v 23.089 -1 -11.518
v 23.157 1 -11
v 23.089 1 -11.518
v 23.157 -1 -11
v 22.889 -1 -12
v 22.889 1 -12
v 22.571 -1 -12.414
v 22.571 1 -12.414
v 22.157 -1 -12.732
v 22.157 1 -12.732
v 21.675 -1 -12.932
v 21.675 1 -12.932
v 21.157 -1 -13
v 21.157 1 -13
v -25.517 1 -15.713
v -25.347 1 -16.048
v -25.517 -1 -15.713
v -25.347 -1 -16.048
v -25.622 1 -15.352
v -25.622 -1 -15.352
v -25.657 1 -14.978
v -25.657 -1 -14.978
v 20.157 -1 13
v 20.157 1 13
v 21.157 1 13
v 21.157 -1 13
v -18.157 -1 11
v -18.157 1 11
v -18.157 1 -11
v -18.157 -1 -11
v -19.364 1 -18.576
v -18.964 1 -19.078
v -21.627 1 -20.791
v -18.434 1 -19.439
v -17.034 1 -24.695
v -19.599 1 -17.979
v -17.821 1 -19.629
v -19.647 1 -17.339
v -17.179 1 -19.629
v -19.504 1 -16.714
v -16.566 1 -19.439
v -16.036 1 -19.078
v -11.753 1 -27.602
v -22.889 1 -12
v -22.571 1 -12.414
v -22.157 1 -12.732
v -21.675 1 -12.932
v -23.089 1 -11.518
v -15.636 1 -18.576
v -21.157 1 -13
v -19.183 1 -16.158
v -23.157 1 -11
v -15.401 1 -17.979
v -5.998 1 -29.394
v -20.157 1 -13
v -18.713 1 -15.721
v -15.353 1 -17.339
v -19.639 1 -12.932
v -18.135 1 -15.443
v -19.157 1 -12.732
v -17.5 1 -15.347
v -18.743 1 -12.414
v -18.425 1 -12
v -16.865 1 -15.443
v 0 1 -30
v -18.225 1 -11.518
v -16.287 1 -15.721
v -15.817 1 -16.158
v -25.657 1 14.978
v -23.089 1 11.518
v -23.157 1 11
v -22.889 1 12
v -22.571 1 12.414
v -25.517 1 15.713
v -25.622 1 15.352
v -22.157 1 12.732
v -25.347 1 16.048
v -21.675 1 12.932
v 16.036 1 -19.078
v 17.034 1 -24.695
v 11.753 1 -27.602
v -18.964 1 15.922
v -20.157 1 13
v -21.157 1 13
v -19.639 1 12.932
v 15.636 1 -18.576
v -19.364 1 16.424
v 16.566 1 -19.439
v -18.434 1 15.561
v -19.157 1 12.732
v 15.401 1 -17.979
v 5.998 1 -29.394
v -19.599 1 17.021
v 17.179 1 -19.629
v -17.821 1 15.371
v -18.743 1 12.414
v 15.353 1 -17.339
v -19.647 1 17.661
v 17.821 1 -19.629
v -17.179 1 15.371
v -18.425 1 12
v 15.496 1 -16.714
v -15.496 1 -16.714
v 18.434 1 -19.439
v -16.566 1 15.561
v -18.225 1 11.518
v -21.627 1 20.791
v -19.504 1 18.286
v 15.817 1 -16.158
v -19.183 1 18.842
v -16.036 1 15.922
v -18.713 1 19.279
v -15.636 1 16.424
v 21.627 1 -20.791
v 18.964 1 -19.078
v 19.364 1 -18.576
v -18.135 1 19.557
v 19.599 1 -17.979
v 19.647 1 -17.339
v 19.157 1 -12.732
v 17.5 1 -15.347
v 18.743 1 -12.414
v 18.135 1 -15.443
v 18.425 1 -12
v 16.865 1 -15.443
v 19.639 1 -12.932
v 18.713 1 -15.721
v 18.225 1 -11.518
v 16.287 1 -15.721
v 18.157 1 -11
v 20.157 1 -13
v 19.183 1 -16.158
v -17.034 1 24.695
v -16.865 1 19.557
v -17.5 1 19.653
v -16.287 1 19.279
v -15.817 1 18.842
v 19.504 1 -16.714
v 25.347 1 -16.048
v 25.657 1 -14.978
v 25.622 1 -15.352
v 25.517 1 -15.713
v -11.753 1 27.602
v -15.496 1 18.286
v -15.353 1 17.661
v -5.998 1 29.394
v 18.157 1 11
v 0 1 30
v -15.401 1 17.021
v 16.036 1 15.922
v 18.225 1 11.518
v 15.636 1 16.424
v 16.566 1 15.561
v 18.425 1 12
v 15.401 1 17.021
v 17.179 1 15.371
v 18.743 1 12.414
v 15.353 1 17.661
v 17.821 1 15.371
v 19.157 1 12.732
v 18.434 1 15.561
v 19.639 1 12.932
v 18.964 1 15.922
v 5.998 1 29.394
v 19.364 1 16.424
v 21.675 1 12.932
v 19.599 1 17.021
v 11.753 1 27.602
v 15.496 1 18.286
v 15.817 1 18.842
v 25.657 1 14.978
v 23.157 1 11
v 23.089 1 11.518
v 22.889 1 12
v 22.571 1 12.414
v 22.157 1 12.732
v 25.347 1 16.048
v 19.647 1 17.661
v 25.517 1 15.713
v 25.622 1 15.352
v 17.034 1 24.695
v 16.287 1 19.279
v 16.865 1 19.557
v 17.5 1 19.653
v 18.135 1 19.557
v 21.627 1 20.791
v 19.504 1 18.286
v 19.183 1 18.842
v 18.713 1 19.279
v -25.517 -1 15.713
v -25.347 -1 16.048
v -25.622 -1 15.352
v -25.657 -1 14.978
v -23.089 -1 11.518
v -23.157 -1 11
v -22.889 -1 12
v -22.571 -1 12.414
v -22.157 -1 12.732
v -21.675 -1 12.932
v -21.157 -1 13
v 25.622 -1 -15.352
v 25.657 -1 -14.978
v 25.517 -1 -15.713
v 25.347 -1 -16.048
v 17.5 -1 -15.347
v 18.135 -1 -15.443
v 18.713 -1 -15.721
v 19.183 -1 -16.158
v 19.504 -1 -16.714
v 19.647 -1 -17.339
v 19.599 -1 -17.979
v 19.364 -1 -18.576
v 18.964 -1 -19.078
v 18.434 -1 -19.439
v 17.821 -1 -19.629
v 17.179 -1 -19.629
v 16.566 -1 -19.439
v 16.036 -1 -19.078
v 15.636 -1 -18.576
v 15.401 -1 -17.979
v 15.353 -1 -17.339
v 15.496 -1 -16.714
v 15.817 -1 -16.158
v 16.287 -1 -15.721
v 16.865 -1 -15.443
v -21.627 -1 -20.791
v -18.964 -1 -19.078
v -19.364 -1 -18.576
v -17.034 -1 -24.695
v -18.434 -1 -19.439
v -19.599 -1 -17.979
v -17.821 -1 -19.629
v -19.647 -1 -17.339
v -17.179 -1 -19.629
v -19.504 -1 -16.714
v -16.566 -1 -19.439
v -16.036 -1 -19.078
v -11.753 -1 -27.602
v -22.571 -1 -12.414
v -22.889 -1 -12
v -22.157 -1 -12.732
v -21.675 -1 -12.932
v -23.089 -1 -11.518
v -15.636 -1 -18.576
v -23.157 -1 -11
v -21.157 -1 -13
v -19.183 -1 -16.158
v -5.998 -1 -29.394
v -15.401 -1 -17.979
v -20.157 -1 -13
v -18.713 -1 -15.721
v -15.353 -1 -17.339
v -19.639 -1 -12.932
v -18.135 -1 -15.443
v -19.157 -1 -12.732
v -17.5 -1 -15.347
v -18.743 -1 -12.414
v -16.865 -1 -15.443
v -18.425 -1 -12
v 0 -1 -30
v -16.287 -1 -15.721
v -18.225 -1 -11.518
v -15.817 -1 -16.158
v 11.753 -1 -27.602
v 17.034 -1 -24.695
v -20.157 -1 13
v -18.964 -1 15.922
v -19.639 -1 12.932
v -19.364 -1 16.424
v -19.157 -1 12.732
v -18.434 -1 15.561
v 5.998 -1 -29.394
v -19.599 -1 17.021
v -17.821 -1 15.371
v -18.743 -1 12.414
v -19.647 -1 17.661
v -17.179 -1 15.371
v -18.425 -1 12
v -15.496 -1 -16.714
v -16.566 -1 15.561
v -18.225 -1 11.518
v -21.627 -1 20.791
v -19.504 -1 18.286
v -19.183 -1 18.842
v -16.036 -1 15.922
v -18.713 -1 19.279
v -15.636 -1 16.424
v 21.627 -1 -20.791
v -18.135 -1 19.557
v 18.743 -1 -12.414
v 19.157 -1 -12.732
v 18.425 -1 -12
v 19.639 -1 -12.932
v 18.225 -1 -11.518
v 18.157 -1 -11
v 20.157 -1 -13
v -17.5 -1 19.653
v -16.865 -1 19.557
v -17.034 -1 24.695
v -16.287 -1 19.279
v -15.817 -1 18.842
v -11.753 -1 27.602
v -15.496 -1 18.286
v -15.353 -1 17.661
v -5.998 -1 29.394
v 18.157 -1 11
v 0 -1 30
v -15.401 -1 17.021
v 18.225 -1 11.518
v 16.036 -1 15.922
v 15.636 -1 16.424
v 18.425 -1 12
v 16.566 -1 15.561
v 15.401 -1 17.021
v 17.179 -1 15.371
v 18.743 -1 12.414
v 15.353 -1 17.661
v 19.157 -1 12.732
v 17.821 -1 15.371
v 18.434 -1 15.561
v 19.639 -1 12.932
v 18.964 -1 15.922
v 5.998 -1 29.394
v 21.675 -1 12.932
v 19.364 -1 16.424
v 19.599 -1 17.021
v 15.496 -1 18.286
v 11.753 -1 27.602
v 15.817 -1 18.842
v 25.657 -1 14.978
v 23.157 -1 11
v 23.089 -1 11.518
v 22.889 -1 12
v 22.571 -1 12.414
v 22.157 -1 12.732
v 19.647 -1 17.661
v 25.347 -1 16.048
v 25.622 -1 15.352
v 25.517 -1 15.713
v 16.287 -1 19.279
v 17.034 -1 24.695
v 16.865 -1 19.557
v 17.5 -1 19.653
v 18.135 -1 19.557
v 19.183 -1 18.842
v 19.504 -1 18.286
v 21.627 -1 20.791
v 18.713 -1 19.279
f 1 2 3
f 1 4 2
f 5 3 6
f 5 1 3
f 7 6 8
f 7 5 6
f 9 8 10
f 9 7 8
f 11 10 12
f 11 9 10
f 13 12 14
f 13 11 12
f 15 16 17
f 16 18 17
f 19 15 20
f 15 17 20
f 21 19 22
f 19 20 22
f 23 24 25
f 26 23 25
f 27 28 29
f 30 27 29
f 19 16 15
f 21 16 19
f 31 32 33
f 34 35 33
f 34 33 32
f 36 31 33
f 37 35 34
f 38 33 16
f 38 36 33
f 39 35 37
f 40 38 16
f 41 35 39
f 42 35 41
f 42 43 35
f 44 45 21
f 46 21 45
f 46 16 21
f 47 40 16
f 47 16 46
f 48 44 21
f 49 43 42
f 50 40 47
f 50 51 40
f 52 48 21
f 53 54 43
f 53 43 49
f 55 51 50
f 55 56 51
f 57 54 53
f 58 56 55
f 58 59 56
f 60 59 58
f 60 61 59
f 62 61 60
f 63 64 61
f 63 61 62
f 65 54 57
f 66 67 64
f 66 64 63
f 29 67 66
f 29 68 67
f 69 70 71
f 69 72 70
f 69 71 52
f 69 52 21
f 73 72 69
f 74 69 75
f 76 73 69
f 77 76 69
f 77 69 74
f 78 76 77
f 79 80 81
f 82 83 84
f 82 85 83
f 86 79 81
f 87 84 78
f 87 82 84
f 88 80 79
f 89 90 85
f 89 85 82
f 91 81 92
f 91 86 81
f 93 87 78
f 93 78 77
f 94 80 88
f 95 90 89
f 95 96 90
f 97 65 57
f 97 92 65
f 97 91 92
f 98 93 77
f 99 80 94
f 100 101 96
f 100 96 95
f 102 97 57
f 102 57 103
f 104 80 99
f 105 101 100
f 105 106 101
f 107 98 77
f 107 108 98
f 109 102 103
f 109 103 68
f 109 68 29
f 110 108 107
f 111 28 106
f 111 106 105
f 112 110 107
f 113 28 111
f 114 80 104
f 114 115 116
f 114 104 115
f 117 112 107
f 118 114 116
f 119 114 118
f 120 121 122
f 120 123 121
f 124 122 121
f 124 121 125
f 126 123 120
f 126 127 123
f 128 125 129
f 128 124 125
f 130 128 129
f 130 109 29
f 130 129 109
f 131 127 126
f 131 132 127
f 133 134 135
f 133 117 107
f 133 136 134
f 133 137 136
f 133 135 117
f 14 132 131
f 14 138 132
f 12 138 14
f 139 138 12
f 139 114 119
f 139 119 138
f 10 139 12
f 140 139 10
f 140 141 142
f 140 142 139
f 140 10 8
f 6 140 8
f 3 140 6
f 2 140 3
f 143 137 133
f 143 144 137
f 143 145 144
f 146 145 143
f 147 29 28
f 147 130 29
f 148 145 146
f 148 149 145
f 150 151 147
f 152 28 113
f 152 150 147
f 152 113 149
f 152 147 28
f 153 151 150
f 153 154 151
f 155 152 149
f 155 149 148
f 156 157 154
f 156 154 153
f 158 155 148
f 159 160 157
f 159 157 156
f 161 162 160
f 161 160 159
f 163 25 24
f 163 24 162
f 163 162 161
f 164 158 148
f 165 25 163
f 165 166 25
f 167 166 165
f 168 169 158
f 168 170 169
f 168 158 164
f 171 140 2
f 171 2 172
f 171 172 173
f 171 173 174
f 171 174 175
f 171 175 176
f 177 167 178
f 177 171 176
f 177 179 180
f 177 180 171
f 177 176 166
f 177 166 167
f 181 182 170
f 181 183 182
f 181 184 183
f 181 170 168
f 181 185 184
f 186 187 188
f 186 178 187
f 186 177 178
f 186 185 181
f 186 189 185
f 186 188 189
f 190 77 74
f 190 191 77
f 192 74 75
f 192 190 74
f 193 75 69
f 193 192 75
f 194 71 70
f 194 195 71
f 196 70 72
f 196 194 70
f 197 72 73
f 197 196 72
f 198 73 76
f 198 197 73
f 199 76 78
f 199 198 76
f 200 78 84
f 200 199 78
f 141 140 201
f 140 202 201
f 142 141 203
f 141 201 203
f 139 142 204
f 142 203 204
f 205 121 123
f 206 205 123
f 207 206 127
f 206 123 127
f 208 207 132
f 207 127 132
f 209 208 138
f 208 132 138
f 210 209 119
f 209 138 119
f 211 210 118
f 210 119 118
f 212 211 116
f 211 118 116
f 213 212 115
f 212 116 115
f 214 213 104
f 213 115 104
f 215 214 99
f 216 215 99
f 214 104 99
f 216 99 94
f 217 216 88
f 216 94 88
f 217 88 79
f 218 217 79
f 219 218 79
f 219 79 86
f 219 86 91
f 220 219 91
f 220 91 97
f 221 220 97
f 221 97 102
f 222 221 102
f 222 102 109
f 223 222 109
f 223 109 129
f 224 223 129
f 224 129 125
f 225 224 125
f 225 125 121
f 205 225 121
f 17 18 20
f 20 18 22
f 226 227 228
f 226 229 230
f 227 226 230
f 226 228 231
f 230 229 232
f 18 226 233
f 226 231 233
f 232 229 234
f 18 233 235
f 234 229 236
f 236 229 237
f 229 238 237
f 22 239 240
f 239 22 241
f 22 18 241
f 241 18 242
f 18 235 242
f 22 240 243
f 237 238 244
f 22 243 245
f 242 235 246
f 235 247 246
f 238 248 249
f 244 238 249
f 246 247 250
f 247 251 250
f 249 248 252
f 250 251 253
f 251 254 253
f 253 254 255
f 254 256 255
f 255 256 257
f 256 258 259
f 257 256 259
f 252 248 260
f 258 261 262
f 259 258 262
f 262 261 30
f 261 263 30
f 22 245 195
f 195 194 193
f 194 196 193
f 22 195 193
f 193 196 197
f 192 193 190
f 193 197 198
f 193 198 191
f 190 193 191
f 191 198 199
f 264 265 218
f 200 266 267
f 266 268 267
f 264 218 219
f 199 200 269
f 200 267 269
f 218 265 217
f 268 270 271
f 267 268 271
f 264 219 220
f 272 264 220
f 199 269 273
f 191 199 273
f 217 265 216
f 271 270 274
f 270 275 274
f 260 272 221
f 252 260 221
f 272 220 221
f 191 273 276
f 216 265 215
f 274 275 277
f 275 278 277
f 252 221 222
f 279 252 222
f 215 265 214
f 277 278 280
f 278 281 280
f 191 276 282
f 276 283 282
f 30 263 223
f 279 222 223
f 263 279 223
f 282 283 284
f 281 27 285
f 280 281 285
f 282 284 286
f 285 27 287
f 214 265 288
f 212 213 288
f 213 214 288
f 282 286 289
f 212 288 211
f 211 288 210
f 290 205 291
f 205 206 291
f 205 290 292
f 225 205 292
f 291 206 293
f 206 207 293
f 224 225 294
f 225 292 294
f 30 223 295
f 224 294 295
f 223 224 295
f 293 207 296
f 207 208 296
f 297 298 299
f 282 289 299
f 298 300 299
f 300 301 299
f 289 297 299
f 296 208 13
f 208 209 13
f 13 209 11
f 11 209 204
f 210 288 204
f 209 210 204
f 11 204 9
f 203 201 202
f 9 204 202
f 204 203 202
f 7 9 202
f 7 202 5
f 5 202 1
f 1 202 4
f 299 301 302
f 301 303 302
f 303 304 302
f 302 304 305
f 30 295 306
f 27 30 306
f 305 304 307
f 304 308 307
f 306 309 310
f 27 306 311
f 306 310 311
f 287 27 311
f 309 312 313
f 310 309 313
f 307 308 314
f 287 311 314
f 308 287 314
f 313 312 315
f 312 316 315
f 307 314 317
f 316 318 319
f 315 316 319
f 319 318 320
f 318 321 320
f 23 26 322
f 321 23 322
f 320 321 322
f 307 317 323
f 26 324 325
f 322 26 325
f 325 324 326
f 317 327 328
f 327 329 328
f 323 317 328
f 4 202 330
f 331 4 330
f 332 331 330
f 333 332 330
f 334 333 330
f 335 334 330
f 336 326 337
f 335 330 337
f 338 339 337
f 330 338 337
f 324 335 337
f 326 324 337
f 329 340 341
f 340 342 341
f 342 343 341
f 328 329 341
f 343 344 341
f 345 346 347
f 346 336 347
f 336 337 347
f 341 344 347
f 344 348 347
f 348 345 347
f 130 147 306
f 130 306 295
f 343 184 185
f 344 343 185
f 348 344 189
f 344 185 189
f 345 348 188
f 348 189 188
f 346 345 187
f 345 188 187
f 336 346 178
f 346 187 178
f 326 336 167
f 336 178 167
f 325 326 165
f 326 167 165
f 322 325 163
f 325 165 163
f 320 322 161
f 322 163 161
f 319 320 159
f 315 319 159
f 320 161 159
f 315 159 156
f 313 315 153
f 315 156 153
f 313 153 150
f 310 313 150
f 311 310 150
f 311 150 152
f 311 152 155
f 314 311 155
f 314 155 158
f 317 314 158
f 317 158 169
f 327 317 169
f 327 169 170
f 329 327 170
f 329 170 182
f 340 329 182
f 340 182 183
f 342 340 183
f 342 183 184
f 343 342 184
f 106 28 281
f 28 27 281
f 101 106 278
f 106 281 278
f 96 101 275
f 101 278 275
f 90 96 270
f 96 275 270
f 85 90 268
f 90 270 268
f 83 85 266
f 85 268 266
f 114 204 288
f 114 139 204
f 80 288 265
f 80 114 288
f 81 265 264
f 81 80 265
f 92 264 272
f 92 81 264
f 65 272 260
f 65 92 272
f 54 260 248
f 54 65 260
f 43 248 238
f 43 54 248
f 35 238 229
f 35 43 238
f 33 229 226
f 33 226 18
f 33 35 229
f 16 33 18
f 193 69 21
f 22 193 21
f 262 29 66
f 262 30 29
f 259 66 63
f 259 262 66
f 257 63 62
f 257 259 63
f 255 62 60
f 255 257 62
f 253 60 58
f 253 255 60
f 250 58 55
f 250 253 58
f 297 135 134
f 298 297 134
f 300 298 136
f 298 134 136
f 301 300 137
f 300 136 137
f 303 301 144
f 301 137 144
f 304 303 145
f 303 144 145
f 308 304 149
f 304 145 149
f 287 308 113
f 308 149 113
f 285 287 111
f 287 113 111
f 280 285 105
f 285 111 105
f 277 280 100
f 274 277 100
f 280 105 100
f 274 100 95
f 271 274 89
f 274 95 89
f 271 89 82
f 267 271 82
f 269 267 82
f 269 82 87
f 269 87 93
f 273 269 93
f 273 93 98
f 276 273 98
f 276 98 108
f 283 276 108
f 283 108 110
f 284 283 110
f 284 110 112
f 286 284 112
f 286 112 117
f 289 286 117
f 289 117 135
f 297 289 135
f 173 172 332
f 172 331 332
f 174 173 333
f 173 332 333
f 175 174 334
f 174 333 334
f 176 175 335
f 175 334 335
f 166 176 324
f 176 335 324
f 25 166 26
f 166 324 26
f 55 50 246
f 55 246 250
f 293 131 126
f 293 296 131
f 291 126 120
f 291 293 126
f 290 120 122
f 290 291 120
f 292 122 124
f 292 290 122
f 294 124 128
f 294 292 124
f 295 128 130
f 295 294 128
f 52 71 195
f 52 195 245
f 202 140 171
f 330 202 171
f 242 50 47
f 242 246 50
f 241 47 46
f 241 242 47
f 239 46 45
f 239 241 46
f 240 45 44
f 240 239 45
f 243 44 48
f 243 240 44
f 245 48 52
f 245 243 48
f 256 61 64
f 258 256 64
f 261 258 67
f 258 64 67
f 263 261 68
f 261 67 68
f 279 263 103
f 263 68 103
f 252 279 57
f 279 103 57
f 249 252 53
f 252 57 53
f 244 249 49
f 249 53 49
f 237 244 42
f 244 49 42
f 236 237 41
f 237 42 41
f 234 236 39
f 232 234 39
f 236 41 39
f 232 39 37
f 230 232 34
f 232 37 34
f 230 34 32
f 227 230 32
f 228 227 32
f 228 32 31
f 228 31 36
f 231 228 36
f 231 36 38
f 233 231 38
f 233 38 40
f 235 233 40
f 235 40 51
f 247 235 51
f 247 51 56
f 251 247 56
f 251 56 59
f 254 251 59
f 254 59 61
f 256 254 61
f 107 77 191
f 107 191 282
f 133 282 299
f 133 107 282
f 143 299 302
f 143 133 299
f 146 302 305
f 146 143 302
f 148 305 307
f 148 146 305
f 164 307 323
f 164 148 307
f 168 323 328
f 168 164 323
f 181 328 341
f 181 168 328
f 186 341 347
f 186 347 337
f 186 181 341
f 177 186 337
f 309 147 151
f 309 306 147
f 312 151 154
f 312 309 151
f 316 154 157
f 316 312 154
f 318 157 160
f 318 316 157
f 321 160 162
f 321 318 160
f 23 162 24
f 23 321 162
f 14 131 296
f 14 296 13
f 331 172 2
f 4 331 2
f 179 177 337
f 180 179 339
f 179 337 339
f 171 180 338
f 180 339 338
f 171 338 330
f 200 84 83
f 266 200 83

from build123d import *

# Parameters (mm, degrees)
SKETCH2_R         = 30
ACRYLICBASE_DEPTH = 1
SKETCH3_W         = 5
SKETCH3_H         = 26
WHEELS_DEPTH      = 43.473521163
SKETCH4_R         = 2.15265
HOLES_DEPTH       = 43.473521163
FLATSIDES_DEPTH   = 43.473521163
RELIEFS_R         = 2


with BuildPart() as part:
    # Sketch2 → AcrylicBase (new, symmetric)
    with BuildSketch(Plane(origin=(0, 0, 0), x_dir=(1, 0, 0), z_dir=(0, 1, 0))):
        Circle(SKETCH2_R)
    extrude(amount=ACRYLICBASE_DEPTH, both=True)

    # Sketch3 → wheels (cut, through all)
    with BuildSketch(Plane(origin=(0, 1, 0), x_dir=(1, 0, 0), z_dir=(0, 1, 0))):
        with Locations((-20.657104633, 0)):
            Rectangle(SKETCH3_W, SKETCH3_H)
        with Locations((20.657104633, 0)):
            Rectangle(SKETCH3_W, SKETCH3_H)
    extrude(amount=-WHEELS_DEPTH, mode=Mode.SUBTRACT)

    # Sketch4 → holes (cut, through all)
    with BuildSketch(Plane(origin=(0, 1, 0), x_dir=(1, 0, 0), z_dir=(0, 1, 0))):
        with Locations((-17.5, 17.5)):
            Circle(SKETCH4_R)
        with Locations((-17.5, -17.5)):
            Circle(SKETCH4_R)
        with Locations((17.5, -17.5)):
            Circle(SKETCH4_R)
        with Locations((17.5, 17.5)):
            Circle(SKETCH4_R)
    extrude(amount=-HOLES_DEPTH, mode=Mode.SUBTRACT)

    # Sketch5 → flatSides (cut, through all)
    with BuildSketch(Plane(origin=(0, 1, 0), x_dir=(1, 0, 0), z_dir=(0, 1, 0))):
        with BuildLine():
            ThreePointArc((-25.657104633, 15.547121337), (-30, 0), (-25.657104633, -15.547121337))
            Line((-25.657104633, -15.547121337), (-25.657104633, 15.547121337))
        make_face()
        with BuildLine():
            Line((25.657104633, 15.547121337), (25.657104633, -15.547121337))
            ThreePointArc((25.657104633, -15.547121337), (30, 0), (25.657104633, 15.547121337))
        make_face()
    extrude(amount=-FLATSIDES_DEPTH, mode=Mode.SUBTRACT)

    # reliefs
    reliefs_edges = [part.edges().sort_by_distance(p)[0] for p in [
        (18.157104633, 0, -13),
        (23.157104633, 0, -13),
        (23.157104633, 0, 13),
        (18.157104633, 0, 13),
        (-23.157104633, 0, 13),
        (-18.157104633, 0, 13),
        (-18.157104633, 0, -13),
        (-23.157104633, 0, -13),
        (25.657104633, 0, -15.547121337),
        (25.657104633, 0, 15.547121337),
        (-25.657104633, 0, 15.547121337),
        (-25.657104633, 0, -15.547121337),
    ]]
    fillet(reliefs_edges, radius=RELIEFS_R)


solid = part.part
